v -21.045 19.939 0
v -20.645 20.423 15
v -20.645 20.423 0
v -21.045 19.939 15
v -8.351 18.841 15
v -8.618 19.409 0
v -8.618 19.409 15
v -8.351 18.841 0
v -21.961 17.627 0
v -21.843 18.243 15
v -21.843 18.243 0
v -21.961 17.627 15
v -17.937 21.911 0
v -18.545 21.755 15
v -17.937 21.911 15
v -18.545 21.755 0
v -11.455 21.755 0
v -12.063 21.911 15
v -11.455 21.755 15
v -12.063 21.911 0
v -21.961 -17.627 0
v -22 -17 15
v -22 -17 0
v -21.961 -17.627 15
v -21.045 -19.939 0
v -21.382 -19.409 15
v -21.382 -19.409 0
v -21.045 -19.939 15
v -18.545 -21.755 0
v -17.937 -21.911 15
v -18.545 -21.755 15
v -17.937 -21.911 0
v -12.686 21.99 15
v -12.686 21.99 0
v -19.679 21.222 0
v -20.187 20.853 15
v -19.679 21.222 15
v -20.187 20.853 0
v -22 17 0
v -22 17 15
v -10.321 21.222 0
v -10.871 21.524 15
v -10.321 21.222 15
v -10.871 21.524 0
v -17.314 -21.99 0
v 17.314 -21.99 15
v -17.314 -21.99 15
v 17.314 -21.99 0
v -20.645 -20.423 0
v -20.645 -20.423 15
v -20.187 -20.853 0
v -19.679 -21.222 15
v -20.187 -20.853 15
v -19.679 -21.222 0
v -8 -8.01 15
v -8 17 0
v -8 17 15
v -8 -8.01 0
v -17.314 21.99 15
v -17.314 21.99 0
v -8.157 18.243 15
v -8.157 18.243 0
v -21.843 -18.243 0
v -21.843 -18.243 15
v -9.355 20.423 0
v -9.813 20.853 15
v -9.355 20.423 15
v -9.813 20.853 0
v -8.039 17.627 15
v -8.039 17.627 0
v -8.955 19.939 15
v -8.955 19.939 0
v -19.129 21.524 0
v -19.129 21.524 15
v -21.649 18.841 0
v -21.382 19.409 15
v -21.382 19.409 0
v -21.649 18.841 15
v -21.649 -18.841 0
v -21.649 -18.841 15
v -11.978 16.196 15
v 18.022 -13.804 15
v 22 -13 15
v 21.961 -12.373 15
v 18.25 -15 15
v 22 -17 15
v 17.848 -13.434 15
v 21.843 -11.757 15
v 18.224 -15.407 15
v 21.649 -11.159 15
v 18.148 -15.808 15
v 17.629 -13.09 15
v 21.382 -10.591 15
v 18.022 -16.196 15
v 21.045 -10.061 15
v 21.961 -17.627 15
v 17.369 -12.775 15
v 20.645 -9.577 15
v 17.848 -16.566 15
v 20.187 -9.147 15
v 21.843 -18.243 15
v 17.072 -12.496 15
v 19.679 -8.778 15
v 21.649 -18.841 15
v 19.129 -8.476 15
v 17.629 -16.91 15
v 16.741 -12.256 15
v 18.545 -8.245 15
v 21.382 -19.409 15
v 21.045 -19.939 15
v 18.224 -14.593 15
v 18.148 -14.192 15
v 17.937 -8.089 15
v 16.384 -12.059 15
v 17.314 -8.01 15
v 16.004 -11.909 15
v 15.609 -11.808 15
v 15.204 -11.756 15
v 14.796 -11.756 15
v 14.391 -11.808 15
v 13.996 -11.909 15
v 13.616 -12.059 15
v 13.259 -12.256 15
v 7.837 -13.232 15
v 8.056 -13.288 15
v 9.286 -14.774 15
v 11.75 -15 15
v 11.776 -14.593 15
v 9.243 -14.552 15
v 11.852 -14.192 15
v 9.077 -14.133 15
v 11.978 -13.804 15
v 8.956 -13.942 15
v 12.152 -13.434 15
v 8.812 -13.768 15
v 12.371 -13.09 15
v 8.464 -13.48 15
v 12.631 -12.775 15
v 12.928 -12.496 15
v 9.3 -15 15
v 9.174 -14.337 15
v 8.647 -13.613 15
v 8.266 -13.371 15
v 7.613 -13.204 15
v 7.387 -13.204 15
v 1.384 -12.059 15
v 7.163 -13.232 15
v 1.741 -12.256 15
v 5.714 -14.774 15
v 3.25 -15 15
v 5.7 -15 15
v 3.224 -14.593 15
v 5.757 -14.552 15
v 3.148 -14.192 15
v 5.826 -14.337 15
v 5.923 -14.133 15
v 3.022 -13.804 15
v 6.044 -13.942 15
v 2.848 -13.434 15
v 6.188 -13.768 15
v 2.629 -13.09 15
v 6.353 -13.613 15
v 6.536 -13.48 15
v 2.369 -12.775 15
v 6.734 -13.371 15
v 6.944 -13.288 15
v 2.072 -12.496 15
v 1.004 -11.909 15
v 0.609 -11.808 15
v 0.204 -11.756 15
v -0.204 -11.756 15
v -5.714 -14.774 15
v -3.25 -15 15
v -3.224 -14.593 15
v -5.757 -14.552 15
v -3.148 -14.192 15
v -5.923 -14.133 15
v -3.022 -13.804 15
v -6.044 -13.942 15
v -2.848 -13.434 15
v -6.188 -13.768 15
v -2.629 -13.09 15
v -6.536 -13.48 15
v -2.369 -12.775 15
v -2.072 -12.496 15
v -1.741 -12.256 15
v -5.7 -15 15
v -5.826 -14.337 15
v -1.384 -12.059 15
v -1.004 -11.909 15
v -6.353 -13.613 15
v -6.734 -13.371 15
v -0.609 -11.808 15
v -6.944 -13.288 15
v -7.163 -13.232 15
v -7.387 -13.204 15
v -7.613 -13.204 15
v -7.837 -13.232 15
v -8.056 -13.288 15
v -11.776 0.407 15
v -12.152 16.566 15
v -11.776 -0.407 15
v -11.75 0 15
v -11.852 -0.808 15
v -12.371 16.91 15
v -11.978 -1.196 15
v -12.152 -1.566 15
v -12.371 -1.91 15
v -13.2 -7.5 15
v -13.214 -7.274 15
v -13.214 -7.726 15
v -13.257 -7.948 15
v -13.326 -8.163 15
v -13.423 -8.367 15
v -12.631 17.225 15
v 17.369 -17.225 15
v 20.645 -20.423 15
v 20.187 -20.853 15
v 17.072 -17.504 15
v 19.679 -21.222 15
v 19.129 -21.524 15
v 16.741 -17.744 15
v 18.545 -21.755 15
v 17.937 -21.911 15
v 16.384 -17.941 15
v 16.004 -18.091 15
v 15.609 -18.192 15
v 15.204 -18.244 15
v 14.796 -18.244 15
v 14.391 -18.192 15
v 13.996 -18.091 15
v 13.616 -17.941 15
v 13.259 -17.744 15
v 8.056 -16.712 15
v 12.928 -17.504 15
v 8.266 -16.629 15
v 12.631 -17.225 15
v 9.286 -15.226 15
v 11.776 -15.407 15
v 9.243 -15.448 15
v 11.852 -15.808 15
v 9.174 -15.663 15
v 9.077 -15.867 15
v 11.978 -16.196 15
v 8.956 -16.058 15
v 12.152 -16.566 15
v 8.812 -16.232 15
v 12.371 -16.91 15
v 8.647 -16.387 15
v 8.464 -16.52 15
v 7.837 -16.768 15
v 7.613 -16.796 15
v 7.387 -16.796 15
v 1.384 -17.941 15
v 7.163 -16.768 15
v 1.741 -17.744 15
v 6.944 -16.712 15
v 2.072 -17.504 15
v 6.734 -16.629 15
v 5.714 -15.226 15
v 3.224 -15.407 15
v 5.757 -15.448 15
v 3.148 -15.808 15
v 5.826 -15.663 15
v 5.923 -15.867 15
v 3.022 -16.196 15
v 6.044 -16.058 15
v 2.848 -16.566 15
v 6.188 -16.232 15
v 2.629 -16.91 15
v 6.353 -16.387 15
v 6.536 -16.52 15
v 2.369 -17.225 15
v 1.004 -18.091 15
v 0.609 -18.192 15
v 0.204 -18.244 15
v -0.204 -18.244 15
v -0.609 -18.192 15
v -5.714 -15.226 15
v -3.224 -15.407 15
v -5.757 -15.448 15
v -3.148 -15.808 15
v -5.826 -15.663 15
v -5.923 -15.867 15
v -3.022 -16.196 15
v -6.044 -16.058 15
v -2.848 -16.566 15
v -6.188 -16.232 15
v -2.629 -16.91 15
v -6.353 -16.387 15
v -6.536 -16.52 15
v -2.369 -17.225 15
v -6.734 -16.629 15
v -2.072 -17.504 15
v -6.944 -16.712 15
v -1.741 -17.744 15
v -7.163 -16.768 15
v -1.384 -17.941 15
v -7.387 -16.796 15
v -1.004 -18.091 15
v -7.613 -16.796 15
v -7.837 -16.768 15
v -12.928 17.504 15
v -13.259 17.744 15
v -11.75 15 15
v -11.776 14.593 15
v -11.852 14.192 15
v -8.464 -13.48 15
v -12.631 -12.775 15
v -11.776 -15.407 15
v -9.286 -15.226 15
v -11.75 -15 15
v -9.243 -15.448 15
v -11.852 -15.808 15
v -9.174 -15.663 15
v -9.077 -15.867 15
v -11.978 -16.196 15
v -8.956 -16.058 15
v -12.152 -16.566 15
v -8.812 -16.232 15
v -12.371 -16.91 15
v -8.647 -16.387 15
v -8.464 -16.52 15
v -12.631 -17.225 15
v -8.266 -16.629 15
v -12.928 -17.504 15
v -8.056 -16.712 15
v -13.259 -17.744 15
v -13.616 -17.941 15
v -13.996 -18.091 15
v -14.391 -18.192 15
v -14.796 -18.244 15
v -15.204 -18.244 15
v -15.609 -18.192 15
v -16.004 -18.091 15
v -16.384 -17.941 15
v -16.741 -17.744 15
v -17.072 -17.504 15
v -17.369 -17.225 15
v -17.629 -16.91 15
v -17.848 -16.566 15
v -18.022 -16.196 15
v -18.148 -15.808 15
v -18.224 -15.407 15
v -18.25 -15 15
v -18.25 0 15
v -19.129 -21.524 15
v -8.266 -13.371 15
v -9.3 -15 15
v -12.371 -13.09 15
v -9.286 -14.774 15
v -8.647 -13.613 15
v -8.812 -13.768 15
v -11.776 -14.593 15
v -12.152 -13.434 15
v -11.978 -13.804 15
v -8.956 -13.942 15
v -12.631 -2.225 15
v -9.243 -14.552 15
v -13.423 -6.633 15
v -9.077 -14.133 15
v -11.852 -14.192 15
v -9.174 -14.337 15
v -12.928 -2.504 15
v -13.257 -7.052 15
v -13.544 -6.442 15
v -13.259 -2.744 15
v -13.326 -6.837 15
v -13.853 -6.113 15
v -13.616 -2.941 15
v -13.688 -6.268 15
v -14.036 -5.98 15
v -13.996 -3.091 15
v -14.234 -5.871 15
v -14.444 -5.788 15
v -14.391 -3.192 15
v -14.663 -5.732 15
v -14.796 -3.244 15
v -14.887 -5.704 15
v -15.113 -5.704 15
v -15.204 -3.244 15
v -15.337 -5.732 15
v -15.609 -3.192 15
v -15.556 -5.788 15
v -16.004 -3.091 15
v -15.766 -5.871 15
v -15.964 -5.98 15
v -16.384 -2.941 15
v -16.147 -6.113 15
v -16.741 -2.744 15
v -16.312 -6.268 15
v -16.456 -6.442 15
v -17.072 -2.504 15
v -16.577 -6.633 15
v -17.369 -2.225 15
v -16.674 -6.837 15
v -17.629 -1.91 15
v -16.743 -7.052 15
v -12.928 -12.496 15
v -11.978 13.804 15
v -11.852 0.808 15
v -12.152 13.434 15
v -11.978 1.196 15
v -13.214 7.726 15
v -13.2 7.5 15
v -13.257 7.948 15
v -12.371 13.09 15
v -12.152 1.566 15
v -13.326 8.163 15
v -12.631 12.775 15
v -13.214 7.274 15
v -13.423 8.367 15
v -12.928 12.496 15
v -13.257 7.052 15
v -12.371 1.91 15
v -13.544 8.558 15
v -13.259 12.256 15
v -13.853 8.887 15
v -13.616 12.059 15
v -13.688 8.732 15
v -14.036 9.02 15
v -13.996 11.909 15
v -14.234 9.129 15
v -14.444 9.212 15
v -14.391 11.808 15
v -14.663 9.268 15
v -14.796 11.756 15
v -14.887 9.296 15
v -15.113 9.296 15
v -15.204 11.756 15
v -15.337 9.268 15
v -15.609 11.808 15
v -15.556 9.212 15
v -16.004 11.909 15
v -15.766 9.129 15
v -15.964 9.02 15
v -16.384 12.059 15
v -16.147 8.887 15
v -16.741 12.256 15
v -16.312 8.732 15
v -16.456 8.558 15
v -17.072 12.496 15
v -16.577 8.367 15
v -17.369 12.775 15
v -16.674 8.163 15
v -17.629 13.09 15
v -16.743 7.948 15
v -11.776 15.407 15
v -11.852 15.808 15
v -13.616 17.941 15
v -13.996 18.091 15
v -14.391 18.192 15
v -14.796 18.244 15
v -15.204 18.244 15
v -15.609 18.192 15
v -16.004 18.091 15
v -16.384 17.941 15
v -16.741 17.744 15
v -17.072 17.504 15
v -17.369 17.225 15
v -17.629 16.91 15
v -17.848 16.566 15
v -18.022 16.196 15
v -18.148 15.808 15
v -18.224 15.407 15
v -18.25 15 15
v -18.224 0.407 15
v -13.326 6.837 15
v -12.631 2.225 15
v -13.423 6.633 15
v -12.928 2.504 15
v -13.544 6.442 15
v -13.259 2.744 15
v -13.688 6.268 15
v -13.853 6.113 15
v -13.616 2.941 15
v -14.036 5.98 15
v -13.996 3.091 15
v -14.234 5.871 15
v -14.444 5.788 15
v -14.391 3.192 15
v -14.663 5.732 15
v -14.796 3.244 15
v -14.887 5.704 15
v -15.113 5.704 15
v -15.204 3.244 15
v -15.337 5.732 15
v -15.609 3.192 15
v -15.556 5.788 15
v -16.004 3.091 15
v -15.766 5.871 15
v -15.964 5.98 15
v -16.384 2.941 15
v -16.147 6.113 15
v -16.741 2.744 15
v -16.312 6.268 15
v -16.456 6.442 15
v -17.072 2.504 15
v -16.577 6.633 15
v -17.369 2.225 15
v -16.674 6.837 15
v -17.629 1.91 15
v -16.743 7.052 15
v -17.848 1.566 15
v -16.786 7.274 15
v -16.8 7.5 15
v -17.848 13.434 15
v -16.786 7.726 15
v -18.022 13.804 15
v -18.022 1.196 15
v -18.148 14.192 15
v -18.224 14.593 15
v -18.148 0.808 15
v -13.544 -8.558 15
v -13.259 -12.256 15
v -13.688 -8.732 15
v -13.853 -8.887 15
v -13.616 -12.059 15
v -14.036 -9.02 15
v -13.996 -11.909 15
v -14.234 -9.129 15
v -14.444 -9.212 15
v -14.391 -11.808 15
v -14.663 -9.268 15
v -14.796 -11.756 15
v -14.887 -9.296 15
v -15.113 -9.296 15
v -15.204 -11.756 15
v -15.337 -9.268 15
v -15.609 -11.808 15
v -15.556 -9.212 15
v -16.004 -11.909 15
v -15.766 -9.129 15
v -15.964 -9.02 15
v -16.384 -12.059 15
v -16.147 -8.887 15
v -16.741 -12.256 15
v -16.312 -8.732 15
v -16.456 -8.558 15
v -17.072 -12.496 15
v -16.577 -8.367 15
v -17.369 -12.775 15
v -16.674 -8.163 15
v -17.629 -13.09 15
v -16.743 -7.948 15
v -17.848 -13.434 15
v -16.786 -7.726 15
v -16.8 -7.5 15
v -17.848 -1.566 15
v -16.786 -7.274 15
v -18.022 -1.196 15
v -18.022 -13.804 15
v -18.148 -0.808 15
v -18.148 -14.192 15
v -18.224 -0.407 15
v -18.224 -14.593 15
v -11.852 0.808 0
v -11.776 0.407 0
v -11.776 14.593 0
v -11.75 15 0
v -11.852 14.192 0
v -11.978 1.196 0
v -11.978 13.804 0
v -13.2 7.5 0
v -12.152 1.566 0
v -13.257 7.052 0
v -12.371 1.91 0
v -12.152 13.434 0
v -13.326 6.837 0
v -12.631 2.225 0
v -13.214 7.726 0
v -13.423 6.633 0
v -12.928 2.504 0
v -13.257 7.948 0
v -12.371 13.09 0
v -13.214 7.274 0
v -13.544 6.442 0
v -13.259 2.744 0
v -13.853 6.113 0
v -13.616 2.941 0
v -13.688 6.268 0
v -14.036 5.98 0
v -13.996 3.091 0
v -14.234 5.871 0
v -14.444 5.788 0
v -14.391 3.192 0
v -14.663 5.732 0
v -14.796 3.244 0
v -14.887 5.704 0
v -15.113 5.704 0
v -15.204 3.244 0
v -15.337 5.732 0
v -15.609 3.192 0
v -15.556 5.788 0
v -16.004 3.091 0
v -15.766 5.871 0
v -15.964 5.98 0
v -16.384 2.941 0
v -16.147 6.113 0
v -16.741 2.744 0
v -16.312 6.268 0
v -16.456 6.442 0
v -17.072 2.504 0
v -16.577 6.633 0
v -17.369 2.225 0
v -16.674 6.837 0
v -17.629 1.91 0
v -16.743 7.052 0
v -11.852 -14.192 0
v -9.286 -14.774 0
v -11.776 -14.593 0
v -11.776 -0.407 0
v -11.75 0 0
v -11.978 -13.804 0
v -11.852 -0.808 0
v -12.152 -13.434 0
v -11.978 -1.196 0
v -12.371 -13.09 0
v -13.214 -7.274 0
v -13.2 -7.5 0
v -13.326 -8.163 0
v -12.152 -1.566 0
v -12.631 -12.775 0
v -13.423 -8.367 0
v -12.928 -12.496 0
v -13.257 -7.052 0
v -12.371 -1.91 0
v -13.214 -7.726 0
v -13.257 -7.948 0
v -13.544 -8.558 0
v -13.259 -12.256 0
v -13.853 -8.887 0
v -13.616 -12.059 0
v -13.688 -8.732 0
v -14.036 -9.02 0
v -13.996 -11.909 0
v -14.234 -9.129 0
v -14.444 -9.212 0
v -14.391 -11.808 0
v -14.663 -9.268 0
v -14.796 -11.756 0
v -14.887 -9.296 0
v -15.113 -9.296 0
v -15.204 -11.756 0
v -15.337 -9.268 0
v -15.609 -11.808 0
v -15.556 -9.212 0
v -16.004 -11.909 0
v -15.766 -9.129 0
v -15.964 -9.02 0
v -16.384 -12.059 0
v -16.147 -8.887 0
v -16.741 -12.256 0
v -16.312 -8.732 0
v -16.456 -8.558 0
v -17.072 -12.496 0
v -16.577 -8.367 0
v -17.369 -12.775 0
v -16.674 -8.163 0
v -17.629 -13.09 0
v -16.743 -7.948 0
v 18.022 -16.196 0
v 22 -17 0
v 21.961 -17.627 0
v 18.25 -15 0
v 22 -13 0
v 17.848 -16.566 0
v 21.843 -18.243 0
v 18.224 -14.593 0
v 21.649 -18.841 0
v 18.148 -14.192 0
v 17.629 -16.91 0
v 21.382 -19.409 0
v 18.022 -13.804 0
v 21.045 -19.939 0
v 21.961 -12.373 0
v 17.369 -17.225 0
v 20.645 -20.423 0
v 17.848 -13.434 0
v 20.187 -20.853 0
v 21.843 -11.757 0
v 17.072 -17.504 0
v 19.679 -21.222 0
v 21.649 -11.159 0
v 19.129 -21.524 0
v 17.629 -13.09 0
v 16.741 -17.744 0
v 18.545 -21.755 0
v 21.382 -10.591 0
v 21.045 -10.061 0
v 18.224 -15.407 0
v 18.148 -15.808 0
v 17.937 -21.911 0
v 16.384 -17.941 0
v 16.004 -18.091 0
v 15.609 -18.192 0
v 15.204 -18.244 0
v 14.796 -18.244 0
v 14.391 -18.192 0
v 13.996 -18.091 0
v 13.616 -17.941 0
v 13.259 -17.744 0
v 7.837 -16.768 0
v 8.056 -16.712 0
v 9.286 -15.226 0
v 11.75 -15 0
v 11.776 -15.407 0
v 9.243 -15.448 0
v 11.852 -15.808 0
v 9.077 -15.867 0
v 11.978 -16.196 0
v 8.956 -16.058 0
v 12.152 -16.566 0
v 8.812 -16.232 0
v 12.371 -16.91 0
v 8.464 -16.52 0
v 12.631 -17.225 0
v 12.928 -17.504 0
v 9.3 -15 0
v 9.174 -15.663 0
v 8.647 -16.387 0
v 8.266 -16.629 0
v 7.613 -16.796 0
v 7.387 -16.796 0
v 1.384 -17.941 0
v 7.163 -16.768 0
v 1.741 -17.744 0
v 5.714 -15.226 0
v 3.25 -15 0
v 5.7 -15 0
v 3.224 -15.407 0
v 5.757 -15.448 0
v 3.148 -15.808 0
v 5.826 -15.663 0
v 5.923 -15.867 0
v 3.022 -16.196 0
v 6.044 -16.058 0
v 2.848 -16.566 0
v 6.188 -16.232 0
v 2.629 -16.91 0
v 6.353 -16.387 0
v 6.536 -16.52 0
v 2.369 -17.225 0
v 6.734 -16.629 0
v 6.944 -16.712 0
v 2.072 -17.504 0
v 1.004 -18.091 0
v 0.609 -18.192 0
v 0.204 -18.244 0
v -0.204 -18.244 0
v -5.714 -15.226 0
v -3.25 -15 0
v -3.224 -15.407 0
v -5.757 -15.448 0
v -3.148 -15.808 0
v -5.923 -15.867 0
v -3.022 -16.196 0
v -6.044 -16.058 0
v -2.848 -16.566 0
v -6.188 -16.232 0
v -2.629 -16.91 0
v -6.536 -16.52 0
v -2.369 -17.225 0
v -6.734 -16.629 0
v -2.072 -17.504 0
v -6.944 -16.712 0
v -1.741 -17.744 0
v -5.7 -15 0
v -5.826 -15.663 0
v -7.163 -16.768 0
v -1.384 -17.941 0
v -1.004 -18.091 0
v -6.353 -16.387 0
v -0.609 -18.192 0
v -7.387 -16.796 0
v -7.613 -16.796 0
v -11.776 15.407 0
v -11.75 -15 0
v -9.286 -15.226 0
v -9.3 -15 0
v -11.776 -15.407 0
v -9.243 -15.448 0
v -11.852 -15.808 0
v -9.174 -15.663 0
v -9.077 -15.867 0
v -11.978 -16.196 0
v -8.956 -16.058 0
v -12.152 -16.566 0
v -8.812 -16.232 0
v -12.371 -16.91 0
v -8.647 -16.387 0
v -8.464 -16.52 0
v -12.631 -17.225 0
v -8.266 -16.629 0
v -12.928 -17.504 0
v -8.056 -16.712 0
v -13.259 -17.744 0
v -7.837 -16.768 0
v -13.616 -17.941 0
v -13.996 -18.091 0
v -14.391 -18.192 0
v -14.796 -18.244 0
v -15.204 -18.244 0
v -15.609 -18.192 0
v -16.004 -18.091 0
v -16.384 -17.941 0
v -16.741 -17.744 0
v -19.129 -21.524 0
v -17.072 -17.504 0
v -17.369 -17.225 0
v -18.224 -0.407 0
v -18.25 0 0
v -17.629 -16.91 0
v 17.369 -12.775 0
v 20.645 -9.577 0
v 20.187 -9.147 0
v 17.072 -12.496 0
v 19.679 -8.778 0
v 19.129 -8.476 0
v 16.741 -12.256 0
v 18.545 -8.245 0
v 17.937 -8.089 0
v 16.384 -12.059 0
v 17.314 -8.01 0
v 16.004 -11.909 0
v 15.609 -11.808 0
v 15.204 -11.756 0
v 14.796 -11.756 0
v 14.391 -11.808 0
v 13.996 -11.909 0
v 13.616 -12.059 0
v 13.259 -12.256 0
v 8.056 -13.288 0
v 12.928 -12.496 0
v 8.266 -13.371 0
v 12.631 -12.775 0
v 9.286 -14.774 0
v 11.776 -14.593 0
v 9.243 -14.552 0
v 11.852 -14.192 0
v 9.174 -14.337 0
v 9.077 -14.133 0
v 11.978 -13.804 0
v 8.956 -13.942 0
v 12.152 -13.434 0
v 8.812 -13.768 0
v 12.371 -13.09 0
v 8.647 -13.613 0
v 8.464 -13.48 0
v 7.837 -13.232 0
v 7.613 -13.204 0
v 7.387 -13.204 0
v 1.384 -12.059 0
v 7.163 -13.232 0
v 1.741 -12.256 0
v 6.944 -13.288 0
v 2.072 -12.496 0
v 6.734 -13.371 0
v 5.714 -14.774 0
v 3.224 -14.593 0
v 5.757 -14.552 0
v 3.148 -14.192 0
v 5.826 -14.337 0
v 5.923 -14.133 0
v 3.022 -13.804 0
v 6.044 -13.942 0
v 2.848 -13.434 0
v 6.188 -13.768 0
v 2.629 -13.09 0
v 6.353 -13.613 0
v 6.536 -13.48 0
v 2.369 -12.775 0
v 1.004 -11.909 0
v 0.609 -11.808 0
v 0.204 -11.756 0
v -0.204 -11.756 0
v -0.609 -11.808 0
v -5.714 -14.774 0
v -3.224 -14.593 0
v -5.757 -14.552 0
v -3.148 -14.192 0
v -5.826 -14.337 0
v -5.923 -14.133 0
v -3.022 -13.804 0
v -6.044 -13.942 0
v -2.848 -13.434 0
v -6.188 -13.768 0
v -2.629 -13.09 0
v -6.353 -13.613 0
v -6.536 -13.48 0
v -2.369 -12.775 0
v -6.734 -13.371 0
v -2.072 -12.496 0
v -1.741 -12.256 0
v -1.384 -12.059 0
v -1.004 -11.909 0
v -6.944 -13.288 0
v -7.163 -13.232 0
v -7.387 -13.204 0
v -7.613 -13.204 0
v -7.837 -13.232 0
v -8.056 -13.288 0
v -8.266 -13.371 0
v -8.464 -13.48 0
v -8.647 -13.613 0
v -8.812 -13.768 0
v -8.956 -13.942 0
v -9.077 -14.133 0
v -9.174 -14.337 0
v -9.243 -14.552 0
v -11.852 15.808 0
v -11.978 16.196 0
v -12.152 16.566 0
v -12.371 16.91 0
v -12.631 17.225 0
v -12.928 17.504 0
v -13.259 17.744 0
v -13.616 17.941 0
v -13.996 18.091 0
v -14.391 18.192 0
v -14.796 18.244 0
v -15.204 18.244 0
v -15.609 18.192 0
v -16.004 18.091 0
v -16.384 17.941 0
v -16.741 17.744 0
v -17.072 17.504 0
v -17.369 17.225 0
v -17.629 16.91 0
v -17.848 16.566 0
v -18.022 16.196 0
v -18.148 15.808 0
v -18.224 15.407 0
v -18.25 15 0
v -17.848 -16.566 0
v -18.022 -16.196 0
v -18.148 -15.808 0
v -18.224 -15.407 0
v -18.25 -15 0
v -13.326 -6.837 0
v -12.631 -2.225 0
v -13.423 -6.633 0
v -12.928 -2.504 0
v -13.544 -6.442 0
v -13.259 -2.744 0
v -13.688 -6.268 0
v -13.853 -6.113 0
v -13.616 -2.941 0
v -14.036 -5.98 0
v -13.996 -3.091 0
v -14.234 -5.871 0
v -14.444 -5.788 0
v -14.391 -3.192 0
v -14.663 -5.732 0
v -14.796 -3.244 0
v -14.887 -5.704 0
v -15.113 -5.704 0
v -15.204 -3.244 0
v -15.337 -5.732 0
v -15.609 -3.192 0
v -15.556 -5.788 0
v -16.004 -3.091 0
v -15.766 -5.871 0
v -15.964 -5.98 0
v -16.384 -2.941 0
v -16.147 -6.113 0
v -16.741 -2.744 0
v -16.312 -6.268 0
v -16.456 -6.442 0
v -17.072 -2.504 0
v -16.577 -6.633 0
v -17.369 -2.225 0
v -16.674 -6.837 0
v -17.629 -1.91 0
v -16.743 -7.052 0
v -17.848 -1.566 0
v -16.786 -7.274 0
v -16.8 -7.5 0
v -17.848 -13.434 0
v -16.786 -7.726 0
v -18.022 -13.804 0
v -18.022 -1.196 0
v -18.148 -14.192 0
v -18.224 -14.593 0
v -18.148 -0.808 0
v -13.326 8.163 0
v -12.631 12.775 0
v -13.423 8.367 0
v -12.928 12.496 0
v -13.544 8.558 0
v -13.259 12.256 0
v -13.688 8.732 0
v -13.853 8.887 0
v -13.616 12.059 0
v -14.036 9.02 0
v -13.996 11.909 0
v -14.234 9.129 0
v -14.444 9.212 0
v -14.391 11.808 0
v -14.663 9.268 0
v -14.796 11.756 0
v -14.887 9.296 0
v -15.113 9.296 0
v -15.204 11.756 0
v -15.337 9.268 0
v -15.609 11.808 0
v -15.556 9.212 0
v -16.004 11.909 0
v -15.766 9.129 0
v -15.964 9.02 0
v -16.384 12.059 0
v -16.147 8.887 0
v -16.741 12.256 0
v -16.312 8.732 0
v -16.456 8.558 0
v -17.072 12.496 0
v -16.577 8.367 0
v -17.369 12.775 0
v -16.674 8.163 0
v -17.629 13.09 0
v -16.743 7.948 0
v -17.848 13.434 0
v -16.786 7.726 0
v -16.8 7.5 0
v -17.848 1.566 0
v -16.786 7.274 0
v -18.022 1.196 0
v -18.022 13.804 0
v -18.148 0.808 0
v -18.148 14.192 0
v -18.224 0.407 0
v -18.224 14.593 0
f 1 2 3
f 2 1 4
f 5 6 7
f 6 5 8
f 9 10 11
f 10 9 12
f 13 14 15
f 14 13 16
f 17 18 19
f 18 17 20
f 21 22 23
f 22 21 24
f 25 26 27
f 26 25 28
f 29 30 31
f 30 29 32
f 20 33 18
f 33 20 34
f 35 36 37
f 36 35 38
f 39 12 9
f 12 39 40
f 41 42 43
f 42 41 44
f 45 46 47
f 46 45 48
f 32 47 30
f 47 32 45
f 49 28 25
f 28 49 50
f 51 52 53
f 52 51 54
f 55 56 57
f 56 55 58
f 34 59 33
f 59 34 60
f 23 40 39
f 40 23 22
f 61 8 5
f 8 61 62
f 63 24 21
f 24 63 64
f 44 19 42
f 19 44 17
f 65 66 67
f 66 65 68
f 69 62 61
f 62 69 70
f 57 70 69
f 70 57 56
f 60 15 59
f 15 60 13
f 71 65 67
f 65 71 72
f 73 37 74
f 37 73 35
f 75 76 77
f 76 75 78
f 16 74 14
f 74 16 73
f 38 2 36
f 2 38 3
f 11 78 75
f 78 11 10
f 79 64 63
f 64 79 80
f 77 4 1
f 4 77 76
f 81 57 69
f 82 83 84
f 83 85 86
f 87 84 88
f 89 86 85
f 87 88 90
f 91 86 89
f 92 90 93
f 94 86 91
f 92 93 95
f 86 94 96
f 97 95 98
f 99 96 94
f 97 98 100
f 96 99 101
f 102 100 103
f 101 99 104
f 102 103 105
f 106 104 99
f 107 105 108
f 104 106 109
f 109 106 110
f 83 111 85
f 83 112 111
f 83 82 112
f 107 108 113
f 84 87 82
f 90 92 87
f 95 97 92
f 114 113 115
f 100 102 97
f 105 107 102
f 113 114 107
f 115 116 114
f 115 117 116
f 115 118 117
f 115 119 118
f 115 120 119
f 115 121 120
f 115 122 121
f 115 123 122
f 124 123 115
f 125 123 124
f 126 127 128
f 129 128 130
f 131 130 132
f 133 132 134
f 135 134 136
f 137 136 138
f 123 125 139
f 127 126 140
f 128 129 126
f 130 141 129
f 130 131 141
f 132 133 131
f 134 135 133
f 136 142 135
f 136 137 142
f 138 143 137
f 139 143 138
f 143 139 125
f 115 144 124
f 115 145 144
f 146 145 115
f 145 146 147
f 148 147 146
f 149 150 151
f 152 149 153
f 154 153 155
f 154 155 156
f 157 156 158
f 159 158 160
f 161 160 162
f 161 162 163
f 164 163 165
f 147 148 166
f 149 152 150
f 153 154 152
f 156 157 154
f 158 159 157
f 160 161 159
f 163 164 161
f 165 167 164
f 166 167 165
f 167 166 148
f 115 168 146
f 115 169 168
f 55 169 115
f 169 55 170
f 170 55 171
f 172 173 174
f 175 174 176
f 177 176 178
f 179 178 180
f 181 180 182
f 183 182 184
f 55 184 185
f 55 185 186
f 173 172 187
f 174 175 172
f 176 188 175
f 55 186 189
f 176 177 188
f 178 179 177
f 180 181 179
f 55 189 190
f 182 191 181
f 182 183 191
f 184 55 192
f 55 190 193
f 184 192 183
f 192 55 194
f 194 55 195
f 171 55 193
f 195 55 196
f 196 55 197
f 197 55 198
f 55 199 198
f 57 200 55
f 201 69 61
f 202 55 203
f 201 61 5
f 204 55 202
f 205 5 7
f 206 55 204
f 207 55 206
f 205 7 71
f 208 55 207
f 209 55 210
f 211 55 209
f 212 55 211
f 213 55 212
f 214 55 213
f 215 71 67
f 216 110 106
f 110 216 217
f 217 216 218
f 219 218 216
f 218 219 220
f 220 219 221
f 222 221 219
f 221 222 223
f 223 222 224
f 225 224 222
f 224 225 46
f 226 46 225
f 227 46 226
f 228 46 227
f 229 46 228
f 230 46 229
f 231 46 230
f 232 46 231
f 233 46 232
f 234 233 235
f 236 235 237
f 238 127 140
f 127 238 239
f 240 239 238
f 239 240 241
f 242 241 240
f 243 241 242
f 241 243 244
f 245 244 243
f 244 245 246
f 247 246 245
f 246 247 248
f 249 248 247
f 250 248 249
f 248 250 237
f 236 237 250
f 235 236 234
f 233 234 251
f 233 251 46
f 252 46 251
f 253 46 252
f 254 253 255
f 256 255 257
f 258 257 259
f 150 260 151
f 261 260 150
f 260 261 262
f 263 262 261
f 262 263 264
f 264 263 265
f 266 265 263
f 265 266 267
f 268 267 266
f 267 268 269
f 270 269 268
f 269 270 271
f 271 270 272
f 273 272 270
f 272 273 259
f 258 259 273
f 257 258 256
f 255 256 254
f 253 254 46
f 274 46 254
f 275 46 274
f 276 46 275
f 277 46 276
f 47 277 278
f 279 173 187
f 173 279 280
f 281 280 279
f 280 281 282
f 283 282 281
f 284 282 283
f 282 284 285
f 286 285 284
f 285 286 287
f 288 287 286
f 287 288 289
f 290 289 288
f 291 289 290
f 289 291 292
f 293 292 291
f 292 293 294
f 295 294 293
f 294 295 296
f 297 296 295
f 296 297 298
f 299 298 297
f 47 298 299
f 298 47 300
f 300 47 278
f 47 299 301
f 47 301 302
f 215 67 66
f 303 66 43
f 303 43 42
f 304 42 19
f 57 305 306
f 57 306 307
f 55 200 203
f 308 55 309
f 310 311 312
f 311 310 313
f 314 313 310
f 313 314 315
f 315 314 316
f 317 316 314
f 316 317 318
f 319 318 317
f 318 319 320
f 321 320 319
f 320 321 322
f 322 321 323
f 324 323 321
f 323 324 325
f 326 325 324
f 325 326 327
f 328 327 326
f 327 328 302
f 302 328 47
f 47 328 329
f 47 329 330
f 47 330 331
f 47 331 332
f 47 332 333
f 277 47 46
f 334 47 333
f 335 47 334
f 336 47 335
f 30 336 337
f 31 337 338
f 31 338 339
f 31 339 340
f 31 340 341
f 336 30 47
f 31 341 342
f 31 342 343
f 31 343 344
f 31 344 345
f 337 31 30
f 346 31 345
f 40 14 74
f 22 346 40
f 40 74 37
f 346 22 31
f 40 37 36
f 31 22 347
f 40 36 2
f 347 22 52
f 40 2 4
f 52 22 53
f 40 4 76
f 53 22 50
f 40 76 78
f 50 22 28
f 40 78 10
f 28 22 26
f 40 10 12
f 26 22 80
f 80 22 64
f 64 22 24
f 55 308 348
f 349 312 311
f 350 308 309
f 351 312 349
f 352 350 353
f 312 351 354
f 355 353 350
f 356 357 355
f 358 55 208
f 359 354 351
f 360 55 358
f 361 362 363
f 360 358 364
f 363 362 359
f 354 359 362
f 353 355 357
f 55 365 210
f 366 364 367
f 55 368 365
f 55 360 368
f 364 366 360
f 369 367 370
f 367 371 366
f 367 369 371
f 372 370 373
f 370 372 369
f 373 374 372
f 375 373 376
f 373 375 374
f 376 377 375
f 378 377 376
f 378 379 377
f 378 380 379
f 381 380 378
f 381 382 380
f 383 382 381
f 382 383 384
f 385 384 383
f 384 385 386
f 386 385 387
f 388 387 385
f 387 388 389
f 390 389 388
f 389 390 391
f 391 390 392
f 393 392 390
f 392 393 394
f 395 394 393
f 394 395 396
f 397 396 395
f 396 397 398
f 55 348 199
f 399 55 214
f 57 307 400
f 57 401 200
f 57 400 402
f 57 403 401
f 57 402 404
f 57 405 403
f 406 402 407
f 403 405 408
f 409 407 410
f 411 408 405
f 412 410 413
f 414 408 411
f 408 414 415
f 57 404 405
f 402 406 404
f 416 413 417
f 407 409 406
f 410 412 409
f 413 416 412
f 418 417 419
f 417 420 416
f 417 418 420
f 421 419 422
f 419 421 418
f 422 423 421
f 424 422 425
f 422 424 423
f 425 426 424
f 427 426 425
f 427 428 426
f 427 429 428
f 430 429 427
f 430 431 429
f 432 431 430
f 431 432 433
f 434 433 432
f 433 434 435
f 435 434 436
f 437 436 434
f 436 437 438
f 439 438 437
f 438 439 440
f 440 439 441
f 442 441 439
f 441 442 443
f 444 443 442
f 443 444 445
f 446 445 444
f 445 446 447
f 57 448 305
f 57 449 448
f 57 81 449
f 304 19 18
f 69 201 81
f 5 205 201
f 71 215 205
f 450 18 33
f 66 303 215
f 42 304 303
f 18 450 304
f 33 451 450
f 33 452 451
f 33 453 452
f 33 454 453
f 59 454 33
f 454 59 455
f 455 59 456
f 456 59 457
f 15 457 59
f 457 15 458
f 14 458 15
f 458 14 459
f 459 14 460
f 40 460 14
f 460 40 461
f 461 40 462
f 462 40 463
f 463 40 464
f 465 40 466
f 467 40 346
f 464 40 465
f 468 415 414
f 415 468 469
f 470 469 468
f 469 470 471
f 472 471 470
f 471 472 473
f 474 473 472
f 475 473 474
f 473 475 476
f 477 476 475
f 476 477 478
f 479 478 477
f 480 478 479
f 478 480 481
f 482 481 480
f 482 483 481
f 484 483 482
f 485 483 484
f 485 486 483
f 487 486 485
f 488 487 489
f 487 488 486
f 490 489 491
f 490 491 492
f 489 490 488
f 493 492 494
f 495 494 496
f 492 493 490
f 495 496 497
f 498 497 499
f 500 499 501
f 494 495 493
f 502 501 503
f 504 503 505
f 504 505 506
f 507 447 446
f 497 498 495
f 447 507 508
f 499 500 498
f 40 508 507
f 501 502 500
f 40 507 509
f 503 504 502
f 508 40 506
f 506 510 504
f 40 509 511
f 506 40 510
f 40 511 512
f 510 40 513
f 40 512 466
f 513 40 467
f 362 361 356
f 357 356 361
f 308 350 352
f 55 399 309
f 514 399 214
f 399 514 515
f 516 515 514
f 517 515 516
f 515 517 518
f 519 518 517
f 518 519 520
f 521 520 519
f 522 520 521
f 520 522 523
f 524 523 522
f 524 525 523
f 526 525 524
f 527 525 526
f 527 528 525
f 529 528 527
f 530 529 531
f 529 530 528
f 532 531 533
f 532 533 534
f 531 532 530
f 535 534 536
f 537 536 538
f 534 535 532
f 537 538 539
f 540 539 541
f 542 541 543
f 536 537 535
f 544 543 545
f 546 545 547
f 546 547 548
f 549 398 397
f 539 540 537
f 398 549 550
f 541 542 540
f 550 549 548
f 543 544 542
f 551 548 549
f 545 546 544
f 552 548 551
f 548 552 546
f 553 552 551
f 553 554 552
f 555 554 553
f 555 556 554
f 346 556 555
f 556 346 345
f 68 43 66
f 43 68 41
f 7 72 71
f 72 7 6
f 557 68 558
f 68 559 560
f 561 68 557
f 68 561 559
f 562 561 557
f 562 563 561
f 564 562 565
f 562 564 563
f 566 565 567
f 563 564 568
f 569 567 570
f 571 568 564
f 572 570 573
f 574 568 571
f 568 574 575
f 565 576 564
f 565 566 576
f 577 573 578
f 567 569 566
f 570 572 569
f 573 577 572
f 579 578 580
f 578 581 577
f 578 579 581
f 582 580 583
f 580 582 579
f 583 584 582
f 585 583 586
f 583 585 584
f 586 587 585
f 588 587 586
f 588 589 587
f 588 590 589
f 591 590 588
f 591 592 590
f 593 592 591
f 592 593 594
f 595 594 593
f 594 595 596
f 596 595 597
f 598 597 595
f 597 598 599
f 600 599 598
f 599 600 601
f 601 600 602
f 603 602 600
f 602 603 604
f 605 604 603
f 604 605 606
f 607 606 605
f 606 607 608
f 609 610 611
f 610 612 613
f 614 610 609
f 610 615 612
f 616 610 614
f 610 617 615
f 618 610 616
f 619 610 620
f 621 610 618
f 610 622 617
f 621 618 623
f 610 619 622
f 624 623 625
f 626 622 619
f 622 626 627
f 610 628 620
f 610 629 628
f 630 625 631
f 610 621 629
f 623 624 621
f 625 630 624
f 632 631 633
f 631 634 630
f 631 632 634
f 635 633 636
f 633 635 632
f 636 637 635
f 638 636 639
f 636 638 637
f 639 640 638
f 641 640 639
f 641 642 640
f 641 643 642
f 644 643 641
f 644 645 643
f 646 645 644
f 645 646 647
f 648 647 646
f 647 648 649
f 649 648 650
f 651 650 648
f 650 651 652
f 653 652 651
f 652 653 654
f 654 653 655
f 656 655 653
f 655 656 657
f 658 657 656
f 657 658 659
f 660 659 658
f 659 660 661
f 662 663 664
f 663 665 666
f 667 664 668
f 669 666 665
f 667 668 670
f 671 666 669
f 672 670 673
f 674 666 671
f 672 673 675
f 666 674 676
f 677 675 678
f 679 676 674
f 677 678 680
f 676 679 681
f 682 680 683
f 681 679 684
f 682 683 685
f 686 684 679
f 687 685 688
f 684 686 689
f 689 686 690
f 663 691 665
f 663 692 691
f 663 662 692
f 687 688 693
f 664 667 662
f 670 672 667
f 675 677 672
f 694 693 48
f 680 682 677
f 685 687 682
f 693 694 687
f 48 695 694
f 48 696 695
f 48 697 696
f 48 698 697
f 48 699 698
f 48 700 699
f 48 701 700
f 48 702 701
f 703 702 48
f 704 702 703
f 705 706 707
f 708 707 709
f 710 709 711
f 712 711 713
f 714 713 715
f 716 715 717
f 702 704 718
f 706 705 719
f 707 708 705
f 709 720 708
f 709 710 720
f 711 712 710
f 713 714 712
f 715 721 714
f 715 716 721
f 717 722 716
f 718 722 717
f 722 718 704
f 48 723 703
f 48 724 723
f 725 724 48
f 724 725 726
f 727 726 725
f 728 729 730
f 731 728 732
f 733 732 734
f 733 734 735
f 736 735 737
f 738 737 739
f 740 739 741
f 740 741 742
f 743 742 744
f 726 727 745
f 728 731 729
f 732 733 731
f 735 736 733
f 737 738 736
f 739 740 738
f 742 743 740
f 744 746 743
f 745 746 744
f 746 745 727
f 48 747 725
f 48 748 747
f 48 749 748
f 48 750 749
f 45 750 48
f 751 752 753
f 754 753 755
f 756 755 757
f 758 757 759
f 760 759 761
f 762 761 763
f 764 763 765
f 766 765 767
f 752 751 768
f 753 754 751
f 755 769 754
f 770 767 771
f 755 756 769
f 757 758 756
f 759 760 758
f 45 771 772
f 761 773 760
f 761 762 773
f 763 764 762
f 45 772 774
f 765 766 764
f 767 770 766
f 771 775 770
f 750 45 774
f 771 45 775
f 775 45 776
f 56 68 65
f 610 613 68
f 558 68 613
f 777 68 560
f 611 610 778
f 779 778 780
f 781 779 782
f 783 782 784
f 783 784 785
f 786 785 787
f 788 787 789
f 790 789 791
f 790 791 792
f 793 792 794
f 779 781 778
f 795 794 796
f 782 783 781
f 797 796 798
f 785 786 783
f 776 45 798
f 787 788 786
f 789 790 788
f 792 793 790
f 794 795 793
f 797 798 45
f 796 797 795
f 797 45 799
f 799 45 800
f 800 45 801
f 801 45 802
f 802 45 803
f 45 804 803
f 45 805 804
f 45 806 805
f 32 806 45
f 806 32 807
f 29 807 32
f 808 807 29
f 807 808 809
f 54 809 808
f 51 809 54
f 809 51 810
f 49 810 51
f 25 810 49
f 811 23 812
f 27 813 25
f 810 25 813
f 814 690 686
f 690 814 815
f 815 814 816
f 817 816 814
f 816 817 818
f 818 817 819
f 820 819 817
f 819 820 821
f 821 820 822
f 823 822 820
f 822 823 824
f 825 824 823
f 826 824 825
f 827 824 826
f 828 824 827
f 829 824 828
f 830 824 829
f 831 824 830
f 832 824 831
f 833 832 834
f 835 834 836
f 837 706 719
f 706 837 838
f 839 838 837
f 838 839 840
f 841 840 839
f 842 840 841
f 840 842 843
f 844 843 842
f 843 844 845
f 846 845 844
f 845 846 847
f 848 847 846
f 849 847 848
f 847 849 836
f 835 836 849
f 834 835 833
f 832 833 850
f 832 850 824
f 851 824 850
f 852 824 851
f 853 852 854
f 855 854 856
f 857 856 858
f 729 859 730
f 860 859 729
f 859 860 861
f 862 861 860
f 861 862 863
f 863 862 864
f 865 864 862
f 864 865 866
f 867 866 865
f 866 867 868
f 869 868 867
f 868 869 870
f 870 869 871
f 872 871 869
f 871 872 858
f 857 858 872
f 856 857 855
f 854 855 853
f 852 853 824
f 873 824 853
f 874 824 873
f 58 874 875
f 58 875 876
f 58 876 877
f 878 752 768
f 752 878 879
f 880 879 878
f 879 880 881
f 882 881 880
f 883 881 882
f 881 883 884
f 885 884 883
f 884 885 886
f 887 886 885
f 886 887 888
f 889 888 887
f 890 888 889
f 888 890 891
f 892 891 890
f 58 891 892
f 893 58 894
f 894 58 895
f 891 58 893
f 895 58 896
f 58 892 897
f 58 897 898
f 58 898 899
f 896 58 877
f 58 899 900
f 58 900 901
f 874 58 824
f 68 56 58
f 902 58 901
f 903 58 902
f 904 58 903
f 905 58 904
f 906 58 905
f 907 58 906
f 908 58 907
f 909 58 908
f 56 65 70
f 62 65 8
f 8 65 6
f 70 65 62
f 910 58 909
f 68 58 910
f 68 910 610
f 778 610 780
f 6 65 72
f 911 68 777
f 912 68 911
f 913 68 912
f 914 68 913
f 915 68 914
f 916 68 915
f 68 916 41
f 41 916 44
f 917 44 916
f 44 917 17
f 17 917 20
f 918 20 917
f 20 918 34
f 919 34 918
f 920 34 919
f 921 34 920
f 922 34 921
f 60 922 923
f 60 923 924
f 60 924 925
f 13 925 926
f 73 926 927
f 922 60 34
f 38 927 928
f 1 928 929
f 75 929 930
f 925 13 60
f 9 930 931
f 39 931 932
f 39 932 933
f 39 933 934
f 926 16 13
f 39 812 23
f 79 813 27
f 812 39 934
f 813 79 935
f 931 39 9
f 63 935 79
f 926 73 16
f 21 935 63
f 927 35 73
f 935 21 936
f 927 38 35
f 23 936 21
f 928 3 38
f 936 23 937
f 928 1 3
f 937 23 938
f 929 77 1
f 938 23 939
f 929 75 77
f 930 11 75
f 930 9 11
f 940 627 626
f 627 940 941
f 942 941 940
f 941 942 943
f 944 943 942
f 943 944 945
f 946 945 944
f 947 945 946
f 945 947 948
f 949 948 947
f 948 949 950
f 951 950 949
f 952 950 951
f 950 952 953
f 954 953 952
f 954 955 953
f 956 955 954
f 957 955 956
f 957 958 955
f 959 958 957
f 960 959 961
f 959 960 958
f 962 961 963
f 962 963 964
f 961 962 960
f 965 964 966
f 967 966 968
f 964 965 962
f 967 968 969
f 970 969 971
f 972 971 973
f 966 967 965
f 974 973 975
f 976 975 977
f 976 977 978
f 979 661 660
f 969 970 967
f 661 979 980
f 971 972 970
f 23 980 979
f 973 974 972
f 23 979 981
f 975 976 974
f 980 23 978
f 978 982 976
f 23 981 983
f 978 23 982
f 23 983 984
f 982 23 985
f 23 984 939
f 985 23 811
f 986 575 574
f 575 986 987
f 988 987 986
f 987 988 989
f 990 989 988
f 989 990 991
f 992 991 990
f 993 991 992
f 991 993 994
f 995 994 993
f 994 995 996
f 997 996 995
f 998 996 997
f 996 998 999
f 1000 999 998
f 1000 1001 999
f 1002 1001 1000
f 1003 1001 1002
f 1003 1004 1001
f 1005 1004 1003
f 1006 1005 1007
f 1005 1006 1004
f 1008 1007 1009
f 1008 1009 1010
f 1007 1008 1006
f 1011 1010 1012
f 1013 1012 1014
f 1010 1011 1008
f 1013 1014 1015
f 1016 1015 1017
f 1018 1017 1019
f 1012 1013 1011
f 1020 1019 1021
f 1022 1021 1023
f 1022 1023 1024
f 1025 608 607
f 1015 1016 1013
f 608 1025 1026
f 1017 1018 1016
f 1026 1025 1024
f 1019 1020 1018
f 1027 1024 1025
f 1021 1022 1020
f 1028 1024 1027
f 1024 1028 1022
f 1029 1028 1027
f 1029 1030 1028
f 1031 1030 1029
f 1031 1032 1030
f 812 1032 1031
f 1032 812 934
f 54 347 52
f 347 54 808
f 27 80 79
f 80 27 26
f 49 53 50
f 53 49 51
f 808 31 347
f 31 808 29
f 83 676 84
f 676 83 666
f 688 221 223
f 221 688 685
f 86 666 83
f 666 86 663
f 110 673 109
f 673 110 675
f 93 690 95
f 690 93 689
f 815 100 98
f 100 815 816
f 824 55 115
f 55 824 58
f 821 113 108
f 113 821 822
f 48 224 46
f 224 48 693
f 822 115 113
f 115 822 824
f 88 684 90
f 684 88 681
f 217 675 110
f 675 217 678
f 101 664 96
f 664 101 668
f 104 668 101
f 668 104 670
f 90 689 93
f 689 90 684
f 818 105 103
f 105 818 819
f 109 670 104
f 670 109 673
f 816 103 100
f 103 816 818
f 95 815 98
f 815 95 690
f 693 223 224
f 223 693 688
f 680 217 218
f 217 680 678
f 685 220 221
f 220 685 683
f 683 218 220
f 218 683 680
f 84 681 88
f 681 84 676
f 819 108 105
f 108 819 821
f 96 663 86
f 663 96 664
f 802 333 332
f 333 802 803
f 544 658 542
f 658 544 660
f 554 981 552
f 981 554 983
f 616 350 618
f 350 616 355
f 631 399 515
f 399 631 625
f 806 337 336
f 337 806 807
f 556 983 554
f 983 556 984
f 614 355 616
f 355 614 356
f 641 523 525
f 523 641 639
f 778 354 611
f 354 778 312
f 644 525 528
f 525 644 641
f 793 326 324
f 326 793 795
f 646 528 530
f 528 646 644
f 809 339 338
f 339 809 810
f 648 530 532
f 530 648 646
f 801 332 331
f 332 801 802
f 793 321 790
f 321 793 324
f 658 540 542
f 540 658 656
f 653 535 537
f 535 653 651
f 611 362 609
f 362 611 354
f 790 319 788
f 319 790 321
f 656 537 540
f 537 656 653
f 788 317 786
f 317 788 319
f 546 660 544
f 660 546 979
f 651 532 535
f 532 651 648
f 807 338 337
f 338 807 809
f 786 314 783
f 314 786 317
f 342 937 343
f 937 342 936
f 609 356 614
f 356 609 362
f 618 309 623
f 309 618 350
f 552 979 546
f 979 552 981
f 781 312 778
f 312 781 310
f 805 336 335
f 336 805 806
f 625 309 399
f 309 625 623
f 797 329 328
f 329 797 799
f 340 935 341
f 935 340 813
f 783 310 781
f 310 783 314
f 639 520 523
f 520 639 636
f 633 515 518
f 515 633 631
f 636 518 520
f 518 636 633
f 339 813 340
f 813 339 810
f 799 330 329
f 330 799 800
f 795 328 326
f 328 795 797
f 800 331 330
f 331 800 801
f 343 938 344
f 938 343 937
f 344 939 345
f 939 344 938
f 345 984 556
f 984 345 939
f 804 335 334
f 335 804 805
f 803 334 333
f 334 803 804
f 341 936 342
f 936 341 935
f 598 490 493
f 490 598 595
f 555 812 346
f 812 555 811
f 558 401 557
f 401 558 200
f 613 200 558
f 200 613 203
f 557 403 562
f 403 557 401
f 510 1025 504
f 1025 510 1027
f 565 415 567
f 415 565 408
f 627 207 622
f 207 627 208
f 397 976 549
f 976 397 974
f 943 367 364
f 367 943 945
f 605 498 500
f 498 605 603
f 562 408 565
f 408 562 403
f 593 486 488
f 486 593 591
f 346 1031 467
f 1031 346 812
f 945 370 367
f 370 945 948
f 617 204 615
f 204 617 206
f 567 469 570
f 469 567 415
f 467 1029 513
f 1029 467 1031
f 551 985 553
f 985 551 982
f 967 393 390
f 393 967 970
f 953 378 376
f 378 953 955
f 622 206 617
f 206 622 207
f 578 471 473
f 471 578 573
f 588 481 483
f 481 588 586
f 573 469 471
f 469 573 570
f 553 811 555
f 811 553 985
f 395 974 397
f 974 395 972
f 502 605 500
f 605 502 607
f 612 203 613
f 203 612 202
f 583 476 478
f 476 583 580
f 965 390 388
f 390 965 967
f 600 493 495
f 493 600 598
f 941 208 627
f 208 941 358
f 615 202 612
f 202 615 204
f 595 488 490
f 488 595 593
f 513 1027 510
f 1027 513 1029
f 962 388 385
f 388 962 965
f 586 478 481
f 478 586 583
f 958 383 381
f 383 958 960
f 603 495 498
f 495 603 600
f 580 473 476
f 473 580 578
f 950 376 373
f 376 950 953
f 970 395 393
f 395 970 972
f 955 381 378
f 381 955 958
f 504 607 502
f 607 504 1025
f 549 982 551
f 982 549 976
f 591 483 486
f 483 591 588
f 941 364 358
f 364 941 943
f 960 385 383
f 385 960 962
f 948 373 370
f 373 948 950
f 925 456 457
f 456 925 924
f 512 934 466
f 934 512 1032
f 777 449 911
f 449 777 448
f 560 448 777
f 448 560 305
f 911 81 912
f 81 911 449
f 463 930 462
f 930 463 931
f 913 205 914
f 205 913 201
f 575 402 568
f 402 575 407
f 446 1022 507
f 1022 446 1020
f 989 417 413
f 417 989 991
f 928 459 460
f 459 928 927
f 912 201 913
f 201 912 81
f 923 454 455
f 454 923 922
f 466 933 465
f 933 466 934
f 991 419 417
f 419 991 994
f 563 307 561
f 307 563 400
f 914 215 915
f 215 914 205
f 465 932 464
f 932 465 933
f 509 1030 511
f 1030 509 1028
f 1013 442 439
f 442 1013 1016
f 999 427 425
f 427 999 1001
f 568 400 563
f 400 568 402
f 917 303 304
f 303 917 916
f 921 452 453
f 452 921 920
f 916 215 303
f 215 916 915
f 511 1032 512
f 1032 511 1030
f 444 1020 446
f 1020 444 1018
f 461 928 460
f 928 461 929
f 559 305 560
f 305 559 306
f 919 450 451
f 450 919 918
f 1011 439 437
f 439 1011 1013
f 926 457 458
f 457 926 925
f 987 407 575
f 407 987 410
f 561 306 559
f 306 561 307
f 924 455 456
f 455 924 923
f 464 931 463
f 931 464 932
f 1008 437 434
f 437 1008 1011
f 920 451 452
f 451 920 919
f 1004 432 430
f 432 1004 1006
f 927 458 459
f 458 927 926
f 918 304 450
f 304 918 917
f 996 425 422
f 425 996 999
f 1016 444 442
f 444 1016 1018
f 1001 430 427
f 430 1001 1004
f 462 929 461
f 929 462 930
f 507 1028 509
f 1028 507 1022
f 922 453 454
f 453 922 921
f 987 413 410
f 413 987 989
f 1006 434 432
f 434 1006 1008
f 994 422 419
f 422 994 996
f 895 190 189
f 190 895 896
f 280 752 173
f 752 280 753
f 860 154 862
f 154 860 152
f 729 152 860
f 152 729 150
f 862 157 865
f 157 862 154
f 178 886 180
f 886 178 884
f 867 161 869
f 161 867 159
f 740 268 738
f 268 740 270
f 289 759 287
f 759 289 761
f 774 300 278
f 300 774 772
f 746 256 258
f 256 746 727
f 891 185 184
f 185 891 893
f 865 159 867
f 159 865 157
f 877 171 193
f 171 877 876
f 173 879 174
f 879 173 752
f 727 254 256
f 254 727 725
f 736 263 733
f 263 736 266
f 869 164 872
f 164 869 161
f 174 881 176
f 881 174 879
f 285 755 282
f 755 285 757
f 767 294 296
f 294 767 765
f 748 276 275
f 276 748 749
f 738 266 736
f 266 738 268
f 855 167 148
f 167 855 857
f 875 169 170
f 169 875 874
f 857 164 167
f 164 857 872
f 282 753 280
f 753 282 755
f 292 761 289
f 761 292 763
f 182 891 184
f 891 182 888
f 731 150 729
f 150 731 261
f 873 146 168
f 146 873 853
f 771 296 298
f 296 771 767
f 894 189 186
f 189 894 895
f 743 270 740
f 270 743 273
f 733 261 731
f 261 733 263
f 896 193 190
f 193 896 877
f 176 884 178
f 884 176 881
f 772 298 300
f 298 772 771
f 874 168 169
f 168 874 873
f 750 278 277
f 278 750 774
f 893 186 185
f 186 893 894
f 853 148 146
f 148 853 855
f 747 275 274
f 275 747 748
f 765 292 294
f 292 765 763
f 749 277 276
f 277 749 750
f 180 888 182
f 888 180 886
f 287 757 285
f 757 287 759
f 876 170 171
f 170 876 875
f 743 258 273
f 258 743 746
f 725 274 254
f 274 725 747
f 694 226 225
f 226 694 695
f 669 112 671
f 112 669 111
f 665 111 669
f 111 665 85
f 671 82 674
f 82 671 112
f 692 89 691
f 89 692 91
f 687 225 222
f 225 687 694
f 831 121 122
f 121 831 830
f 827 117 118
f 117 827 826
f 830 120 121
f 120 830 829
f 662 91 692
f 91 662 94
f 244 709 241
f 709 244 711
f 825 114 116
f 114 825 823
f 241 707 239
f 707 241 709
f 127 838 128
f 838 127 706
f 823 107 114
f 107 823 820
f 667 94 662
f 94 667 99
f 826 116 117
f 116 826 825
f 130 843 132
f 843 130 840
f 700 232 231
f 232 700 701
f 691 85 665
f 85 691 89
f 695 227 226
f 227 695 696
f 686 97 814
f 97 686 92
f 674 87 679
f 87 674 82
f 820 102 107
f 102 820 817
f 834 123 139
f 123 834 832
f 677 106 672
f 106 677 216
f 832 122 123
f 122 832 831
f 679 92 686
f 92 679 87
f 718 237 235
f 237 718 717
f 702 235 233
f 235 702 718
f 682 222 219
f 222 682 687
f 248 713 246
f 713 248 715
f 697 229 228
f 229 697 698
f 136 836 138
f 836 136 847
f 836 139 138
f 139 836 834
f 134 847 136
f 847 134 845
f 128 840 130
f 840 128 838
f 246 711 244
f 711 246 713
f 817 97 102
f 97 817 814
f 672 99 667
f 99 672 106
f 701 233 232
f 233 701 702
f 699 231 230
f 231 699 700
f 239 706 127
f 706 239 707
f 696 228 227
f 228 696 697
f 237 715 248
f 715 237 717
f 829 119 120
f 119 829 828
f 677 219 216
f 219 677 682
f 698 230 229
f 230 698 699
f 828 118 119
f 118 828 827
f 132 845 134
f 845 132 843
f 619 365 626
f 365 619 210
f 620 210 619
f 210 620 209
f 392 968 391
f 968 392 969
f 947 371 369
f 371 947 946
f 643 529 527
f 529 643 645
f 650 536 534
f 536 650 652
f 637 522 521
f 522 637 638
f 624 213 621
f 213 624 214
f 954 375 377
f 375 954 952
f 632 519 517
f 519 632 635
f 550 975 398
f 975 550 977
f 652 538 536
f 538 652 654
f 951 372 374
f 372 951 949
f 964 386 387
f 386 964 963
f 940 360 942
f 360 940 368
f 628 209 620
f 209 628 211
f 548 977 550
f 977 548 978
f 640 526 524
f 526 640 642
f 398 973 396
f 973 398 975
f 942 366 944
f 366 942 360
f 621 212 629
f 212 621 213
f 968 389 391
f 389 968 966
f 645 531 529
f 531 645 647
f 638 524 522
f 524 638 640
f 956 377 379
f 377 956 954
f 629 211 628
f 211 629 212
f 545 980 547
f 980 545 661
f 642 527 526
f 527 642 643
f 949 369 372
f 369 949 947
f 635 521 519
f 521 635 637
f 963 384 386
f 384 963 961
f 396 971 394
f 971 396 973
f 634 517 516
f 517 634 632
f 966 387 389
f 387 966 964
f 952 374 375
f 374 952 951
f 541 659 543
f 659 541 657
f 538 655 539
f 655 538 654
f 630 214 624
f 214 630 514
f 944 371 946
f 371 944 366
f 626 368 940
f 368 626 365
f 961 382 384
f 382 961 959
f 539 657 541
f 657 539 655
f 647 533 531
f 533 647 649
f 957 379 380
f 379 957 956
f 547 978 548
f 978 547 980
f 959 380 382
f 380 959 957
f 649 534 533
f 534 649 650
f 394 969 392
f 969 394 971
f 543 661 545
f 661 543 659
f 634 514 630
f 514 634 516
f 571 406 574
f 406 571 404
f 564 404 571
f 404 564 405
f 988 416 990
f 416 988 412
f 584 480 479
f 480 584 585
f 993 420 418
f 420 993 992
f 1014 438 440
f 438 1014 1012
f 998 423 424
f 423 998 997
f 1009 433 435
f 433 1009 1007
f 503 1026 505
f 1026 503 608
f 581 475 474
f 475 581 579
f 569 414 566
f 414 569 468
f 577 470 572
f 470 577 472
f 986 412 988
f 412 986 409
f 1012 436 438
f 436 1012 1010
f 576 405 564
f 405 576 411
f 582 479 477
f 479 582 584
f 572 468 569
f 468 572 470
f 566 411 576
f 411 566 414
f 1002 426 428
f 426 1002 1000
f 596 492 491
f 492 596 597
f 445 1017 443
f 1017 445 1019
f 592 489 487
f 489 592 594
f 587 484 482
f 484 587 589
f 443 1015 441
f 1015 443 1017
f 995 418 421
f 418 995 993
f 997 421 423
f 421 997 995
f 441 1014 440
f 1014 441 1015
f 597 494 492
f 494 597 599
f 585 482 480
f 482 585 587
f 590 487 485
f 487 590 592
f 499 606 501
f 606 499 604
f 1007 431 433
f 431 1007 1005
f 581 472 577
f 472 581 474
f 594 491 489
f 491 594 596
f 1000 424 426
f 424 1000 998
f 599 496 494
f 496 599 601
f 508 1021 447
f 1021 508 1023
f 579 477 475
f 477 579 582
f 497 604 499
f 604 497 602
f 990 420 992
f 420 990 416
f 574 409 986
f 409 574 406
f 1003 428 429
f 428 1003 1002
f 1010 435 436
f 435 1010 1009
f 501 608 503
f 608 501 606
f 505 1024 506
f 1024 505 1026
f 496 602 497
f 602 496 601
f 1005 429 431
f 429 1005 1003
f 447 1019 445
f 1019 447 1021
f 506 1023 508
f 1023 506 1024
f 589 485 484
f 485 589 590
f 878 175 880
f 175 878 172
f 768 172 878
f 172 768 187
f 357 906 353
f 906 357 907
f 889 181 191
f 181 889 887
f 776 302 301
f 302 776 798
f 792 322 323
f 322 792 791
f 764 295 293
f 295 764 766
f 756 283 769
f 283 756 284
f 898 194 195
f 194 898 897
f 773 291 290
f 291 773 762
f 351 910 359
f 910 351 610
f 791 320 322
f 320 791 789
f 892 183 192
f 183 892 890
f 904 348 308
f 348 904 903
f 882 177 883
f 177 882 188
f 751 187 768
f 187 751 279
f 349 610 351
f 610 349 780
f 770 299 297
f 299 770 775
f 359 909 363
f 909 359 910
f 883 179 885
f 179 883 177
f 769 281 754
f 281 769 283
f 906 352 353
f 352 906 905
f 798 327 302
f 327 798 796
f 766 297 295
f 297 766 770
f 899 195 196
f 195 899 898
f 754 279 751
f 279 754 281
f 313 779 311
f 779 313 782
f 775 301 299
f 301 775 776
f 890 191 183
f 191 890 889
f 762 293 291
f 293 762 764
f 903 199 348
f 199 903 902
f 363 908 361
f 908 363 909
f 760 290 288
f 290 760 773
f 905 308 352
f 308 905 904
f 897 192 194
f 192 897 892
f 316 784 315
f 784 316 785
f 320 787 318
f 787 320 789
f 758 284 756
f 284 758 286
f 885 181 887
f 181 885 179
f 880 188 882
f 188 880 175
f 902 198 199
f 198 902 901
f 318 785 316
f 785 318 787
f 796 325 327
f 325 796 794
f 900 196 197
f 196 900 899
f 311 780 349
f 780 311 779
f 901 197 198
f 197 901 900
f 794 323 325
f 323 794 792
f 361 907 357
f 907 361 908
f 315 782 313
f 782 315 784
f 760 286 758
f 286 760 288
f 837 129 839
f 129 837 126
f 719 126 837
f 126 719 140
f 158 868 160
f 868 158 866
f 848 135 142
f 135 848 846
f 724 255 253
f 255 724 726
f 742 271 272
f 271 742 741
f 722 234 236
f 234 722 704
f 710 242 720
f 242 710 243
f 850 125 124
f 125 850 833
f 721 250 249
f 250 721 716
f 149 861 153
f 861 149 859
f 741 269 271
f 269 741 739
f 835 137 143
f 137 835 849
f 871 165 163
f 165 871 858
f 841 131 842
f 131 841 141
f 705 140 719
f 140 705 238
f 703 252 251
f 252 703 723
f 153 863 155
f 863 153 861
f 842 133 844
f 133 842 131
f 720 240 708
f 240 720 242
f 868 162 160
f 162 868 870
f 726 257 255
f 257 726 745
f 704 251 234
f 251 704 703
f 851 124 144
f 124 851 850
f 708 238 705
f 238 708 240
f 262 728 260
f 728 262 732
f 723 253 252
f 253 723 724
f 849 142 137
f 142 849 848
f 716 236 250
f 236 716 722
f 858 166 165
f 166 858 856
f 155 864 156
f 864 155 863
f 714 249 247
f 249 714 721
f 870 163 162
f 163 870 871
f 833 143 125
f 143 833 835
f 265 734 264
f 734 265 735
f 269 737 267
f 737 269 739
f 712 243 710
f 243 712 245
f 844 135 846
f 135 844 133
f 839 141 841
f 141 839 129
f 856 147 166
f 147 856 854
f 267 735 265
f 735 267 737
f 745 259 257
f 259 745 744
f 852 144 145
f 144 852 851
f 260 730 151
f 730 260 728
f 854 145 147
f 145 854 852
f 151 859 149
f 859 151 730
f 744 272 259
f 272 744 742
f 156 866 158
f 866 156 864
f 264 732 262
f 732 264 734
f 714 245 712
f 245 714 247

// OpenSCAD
$fn = 50;

difference() {
	union() {
		translate(v = [-15.0, 0, 0]) {
			hull() {
				translate(v = [-2.0, 17.0, 0]) {
					cylinder(h = 15, r = 5);
				}
				translate(v = [2.0, 17.0, 0]) {
					cylinder(h = 15, r = 5);
				}
				translate(v = [-2.0, -17.0, 0]) {
					cylinder(h = 15, r = 5);
				}
				translate(v = [2.0, -17.0, 0]) {
					cylinder(h = 15, r = 5);
				}
			}
		}
		translate(v = [0, -15.0, 0]) {
			hull() {
				translate(v = [-17.0, 2.0, 0]) {
					cylinder(h = 15, r = 5);
				}
				translate(v = [17.0, 2.0, 0]) {
					cylinder(h = 15, r = 5);
				}
				translate(v = [-17.0, -2.0, 0]) {
					cylinder(h = 15, r = 5);
				}
				translate(v = [17.0, -2.0, 0]) {
					cylinder(h = 15, r = 5);
				}
			}
		}
	}
	union() {
		translate(v = [-15.0, -15.0, 0]) {
			cylinder(h = 15, r = 3.25);
		}
		translate(v = [-15.0, 0.0, 0]) {
			cylinder(h = 15, r = 3.25);
		}
		translate(v = [-15.0, 15.0, 0]) {
			cylinder(h = 15, r = 3.25);
		}
		translate(v = [-15.0, -15.0, 0]) {
			cylinder(h = 15, r = 3.25);
		}
		translate(v = [0.0, -15.0, 0]) {
			cylinder(h = 15, r = 3.25);
		}
		translate(v = [15.0, -15.0, 0]) {
			cylinder(h = 15, r = 3.25);
		}
		translate(v = [-15.0, -15.0, 0]) {
			cylinder(h = 15, r = 1.8);
		}
		translate(v = [-15.0, -7.5, 0]) {
			cylinder(h = 15, r = 1.8);
		}
		translate(v = [-15.0, 0.0, 0]) {
			cylinder(h = 15, r = 1.8);
		}
		translate(v = [-15.0, 7.5, 0]) {
			cylinder(h = 15, r = 1.8);
		}
		translate(v = [-15.0, 15.0, 0]) {
			cylinder(h = 15, r = 1.8);
		}
		translate(v = [-15.0, -15.0, 0]) {
			cylinder(h = 15, r = 1.8);
		}
		translate(v = [-7.5, -15.0, 0]) {
			cylinder(h = 15, r = 1.8);
		}
		translate(v = [0.0, -15.0, 0]) {
			cylinder(h = 15, r = 1.8);
		}
		translate(v = [7.5, -15.0, 0]) {
			cylinder(h = 15, r = 1.8);
		}
		translate(v = [15.0, -15.0, 0]) {
			cylinder(h = 15, r = 1.8);
		}
	}
}
